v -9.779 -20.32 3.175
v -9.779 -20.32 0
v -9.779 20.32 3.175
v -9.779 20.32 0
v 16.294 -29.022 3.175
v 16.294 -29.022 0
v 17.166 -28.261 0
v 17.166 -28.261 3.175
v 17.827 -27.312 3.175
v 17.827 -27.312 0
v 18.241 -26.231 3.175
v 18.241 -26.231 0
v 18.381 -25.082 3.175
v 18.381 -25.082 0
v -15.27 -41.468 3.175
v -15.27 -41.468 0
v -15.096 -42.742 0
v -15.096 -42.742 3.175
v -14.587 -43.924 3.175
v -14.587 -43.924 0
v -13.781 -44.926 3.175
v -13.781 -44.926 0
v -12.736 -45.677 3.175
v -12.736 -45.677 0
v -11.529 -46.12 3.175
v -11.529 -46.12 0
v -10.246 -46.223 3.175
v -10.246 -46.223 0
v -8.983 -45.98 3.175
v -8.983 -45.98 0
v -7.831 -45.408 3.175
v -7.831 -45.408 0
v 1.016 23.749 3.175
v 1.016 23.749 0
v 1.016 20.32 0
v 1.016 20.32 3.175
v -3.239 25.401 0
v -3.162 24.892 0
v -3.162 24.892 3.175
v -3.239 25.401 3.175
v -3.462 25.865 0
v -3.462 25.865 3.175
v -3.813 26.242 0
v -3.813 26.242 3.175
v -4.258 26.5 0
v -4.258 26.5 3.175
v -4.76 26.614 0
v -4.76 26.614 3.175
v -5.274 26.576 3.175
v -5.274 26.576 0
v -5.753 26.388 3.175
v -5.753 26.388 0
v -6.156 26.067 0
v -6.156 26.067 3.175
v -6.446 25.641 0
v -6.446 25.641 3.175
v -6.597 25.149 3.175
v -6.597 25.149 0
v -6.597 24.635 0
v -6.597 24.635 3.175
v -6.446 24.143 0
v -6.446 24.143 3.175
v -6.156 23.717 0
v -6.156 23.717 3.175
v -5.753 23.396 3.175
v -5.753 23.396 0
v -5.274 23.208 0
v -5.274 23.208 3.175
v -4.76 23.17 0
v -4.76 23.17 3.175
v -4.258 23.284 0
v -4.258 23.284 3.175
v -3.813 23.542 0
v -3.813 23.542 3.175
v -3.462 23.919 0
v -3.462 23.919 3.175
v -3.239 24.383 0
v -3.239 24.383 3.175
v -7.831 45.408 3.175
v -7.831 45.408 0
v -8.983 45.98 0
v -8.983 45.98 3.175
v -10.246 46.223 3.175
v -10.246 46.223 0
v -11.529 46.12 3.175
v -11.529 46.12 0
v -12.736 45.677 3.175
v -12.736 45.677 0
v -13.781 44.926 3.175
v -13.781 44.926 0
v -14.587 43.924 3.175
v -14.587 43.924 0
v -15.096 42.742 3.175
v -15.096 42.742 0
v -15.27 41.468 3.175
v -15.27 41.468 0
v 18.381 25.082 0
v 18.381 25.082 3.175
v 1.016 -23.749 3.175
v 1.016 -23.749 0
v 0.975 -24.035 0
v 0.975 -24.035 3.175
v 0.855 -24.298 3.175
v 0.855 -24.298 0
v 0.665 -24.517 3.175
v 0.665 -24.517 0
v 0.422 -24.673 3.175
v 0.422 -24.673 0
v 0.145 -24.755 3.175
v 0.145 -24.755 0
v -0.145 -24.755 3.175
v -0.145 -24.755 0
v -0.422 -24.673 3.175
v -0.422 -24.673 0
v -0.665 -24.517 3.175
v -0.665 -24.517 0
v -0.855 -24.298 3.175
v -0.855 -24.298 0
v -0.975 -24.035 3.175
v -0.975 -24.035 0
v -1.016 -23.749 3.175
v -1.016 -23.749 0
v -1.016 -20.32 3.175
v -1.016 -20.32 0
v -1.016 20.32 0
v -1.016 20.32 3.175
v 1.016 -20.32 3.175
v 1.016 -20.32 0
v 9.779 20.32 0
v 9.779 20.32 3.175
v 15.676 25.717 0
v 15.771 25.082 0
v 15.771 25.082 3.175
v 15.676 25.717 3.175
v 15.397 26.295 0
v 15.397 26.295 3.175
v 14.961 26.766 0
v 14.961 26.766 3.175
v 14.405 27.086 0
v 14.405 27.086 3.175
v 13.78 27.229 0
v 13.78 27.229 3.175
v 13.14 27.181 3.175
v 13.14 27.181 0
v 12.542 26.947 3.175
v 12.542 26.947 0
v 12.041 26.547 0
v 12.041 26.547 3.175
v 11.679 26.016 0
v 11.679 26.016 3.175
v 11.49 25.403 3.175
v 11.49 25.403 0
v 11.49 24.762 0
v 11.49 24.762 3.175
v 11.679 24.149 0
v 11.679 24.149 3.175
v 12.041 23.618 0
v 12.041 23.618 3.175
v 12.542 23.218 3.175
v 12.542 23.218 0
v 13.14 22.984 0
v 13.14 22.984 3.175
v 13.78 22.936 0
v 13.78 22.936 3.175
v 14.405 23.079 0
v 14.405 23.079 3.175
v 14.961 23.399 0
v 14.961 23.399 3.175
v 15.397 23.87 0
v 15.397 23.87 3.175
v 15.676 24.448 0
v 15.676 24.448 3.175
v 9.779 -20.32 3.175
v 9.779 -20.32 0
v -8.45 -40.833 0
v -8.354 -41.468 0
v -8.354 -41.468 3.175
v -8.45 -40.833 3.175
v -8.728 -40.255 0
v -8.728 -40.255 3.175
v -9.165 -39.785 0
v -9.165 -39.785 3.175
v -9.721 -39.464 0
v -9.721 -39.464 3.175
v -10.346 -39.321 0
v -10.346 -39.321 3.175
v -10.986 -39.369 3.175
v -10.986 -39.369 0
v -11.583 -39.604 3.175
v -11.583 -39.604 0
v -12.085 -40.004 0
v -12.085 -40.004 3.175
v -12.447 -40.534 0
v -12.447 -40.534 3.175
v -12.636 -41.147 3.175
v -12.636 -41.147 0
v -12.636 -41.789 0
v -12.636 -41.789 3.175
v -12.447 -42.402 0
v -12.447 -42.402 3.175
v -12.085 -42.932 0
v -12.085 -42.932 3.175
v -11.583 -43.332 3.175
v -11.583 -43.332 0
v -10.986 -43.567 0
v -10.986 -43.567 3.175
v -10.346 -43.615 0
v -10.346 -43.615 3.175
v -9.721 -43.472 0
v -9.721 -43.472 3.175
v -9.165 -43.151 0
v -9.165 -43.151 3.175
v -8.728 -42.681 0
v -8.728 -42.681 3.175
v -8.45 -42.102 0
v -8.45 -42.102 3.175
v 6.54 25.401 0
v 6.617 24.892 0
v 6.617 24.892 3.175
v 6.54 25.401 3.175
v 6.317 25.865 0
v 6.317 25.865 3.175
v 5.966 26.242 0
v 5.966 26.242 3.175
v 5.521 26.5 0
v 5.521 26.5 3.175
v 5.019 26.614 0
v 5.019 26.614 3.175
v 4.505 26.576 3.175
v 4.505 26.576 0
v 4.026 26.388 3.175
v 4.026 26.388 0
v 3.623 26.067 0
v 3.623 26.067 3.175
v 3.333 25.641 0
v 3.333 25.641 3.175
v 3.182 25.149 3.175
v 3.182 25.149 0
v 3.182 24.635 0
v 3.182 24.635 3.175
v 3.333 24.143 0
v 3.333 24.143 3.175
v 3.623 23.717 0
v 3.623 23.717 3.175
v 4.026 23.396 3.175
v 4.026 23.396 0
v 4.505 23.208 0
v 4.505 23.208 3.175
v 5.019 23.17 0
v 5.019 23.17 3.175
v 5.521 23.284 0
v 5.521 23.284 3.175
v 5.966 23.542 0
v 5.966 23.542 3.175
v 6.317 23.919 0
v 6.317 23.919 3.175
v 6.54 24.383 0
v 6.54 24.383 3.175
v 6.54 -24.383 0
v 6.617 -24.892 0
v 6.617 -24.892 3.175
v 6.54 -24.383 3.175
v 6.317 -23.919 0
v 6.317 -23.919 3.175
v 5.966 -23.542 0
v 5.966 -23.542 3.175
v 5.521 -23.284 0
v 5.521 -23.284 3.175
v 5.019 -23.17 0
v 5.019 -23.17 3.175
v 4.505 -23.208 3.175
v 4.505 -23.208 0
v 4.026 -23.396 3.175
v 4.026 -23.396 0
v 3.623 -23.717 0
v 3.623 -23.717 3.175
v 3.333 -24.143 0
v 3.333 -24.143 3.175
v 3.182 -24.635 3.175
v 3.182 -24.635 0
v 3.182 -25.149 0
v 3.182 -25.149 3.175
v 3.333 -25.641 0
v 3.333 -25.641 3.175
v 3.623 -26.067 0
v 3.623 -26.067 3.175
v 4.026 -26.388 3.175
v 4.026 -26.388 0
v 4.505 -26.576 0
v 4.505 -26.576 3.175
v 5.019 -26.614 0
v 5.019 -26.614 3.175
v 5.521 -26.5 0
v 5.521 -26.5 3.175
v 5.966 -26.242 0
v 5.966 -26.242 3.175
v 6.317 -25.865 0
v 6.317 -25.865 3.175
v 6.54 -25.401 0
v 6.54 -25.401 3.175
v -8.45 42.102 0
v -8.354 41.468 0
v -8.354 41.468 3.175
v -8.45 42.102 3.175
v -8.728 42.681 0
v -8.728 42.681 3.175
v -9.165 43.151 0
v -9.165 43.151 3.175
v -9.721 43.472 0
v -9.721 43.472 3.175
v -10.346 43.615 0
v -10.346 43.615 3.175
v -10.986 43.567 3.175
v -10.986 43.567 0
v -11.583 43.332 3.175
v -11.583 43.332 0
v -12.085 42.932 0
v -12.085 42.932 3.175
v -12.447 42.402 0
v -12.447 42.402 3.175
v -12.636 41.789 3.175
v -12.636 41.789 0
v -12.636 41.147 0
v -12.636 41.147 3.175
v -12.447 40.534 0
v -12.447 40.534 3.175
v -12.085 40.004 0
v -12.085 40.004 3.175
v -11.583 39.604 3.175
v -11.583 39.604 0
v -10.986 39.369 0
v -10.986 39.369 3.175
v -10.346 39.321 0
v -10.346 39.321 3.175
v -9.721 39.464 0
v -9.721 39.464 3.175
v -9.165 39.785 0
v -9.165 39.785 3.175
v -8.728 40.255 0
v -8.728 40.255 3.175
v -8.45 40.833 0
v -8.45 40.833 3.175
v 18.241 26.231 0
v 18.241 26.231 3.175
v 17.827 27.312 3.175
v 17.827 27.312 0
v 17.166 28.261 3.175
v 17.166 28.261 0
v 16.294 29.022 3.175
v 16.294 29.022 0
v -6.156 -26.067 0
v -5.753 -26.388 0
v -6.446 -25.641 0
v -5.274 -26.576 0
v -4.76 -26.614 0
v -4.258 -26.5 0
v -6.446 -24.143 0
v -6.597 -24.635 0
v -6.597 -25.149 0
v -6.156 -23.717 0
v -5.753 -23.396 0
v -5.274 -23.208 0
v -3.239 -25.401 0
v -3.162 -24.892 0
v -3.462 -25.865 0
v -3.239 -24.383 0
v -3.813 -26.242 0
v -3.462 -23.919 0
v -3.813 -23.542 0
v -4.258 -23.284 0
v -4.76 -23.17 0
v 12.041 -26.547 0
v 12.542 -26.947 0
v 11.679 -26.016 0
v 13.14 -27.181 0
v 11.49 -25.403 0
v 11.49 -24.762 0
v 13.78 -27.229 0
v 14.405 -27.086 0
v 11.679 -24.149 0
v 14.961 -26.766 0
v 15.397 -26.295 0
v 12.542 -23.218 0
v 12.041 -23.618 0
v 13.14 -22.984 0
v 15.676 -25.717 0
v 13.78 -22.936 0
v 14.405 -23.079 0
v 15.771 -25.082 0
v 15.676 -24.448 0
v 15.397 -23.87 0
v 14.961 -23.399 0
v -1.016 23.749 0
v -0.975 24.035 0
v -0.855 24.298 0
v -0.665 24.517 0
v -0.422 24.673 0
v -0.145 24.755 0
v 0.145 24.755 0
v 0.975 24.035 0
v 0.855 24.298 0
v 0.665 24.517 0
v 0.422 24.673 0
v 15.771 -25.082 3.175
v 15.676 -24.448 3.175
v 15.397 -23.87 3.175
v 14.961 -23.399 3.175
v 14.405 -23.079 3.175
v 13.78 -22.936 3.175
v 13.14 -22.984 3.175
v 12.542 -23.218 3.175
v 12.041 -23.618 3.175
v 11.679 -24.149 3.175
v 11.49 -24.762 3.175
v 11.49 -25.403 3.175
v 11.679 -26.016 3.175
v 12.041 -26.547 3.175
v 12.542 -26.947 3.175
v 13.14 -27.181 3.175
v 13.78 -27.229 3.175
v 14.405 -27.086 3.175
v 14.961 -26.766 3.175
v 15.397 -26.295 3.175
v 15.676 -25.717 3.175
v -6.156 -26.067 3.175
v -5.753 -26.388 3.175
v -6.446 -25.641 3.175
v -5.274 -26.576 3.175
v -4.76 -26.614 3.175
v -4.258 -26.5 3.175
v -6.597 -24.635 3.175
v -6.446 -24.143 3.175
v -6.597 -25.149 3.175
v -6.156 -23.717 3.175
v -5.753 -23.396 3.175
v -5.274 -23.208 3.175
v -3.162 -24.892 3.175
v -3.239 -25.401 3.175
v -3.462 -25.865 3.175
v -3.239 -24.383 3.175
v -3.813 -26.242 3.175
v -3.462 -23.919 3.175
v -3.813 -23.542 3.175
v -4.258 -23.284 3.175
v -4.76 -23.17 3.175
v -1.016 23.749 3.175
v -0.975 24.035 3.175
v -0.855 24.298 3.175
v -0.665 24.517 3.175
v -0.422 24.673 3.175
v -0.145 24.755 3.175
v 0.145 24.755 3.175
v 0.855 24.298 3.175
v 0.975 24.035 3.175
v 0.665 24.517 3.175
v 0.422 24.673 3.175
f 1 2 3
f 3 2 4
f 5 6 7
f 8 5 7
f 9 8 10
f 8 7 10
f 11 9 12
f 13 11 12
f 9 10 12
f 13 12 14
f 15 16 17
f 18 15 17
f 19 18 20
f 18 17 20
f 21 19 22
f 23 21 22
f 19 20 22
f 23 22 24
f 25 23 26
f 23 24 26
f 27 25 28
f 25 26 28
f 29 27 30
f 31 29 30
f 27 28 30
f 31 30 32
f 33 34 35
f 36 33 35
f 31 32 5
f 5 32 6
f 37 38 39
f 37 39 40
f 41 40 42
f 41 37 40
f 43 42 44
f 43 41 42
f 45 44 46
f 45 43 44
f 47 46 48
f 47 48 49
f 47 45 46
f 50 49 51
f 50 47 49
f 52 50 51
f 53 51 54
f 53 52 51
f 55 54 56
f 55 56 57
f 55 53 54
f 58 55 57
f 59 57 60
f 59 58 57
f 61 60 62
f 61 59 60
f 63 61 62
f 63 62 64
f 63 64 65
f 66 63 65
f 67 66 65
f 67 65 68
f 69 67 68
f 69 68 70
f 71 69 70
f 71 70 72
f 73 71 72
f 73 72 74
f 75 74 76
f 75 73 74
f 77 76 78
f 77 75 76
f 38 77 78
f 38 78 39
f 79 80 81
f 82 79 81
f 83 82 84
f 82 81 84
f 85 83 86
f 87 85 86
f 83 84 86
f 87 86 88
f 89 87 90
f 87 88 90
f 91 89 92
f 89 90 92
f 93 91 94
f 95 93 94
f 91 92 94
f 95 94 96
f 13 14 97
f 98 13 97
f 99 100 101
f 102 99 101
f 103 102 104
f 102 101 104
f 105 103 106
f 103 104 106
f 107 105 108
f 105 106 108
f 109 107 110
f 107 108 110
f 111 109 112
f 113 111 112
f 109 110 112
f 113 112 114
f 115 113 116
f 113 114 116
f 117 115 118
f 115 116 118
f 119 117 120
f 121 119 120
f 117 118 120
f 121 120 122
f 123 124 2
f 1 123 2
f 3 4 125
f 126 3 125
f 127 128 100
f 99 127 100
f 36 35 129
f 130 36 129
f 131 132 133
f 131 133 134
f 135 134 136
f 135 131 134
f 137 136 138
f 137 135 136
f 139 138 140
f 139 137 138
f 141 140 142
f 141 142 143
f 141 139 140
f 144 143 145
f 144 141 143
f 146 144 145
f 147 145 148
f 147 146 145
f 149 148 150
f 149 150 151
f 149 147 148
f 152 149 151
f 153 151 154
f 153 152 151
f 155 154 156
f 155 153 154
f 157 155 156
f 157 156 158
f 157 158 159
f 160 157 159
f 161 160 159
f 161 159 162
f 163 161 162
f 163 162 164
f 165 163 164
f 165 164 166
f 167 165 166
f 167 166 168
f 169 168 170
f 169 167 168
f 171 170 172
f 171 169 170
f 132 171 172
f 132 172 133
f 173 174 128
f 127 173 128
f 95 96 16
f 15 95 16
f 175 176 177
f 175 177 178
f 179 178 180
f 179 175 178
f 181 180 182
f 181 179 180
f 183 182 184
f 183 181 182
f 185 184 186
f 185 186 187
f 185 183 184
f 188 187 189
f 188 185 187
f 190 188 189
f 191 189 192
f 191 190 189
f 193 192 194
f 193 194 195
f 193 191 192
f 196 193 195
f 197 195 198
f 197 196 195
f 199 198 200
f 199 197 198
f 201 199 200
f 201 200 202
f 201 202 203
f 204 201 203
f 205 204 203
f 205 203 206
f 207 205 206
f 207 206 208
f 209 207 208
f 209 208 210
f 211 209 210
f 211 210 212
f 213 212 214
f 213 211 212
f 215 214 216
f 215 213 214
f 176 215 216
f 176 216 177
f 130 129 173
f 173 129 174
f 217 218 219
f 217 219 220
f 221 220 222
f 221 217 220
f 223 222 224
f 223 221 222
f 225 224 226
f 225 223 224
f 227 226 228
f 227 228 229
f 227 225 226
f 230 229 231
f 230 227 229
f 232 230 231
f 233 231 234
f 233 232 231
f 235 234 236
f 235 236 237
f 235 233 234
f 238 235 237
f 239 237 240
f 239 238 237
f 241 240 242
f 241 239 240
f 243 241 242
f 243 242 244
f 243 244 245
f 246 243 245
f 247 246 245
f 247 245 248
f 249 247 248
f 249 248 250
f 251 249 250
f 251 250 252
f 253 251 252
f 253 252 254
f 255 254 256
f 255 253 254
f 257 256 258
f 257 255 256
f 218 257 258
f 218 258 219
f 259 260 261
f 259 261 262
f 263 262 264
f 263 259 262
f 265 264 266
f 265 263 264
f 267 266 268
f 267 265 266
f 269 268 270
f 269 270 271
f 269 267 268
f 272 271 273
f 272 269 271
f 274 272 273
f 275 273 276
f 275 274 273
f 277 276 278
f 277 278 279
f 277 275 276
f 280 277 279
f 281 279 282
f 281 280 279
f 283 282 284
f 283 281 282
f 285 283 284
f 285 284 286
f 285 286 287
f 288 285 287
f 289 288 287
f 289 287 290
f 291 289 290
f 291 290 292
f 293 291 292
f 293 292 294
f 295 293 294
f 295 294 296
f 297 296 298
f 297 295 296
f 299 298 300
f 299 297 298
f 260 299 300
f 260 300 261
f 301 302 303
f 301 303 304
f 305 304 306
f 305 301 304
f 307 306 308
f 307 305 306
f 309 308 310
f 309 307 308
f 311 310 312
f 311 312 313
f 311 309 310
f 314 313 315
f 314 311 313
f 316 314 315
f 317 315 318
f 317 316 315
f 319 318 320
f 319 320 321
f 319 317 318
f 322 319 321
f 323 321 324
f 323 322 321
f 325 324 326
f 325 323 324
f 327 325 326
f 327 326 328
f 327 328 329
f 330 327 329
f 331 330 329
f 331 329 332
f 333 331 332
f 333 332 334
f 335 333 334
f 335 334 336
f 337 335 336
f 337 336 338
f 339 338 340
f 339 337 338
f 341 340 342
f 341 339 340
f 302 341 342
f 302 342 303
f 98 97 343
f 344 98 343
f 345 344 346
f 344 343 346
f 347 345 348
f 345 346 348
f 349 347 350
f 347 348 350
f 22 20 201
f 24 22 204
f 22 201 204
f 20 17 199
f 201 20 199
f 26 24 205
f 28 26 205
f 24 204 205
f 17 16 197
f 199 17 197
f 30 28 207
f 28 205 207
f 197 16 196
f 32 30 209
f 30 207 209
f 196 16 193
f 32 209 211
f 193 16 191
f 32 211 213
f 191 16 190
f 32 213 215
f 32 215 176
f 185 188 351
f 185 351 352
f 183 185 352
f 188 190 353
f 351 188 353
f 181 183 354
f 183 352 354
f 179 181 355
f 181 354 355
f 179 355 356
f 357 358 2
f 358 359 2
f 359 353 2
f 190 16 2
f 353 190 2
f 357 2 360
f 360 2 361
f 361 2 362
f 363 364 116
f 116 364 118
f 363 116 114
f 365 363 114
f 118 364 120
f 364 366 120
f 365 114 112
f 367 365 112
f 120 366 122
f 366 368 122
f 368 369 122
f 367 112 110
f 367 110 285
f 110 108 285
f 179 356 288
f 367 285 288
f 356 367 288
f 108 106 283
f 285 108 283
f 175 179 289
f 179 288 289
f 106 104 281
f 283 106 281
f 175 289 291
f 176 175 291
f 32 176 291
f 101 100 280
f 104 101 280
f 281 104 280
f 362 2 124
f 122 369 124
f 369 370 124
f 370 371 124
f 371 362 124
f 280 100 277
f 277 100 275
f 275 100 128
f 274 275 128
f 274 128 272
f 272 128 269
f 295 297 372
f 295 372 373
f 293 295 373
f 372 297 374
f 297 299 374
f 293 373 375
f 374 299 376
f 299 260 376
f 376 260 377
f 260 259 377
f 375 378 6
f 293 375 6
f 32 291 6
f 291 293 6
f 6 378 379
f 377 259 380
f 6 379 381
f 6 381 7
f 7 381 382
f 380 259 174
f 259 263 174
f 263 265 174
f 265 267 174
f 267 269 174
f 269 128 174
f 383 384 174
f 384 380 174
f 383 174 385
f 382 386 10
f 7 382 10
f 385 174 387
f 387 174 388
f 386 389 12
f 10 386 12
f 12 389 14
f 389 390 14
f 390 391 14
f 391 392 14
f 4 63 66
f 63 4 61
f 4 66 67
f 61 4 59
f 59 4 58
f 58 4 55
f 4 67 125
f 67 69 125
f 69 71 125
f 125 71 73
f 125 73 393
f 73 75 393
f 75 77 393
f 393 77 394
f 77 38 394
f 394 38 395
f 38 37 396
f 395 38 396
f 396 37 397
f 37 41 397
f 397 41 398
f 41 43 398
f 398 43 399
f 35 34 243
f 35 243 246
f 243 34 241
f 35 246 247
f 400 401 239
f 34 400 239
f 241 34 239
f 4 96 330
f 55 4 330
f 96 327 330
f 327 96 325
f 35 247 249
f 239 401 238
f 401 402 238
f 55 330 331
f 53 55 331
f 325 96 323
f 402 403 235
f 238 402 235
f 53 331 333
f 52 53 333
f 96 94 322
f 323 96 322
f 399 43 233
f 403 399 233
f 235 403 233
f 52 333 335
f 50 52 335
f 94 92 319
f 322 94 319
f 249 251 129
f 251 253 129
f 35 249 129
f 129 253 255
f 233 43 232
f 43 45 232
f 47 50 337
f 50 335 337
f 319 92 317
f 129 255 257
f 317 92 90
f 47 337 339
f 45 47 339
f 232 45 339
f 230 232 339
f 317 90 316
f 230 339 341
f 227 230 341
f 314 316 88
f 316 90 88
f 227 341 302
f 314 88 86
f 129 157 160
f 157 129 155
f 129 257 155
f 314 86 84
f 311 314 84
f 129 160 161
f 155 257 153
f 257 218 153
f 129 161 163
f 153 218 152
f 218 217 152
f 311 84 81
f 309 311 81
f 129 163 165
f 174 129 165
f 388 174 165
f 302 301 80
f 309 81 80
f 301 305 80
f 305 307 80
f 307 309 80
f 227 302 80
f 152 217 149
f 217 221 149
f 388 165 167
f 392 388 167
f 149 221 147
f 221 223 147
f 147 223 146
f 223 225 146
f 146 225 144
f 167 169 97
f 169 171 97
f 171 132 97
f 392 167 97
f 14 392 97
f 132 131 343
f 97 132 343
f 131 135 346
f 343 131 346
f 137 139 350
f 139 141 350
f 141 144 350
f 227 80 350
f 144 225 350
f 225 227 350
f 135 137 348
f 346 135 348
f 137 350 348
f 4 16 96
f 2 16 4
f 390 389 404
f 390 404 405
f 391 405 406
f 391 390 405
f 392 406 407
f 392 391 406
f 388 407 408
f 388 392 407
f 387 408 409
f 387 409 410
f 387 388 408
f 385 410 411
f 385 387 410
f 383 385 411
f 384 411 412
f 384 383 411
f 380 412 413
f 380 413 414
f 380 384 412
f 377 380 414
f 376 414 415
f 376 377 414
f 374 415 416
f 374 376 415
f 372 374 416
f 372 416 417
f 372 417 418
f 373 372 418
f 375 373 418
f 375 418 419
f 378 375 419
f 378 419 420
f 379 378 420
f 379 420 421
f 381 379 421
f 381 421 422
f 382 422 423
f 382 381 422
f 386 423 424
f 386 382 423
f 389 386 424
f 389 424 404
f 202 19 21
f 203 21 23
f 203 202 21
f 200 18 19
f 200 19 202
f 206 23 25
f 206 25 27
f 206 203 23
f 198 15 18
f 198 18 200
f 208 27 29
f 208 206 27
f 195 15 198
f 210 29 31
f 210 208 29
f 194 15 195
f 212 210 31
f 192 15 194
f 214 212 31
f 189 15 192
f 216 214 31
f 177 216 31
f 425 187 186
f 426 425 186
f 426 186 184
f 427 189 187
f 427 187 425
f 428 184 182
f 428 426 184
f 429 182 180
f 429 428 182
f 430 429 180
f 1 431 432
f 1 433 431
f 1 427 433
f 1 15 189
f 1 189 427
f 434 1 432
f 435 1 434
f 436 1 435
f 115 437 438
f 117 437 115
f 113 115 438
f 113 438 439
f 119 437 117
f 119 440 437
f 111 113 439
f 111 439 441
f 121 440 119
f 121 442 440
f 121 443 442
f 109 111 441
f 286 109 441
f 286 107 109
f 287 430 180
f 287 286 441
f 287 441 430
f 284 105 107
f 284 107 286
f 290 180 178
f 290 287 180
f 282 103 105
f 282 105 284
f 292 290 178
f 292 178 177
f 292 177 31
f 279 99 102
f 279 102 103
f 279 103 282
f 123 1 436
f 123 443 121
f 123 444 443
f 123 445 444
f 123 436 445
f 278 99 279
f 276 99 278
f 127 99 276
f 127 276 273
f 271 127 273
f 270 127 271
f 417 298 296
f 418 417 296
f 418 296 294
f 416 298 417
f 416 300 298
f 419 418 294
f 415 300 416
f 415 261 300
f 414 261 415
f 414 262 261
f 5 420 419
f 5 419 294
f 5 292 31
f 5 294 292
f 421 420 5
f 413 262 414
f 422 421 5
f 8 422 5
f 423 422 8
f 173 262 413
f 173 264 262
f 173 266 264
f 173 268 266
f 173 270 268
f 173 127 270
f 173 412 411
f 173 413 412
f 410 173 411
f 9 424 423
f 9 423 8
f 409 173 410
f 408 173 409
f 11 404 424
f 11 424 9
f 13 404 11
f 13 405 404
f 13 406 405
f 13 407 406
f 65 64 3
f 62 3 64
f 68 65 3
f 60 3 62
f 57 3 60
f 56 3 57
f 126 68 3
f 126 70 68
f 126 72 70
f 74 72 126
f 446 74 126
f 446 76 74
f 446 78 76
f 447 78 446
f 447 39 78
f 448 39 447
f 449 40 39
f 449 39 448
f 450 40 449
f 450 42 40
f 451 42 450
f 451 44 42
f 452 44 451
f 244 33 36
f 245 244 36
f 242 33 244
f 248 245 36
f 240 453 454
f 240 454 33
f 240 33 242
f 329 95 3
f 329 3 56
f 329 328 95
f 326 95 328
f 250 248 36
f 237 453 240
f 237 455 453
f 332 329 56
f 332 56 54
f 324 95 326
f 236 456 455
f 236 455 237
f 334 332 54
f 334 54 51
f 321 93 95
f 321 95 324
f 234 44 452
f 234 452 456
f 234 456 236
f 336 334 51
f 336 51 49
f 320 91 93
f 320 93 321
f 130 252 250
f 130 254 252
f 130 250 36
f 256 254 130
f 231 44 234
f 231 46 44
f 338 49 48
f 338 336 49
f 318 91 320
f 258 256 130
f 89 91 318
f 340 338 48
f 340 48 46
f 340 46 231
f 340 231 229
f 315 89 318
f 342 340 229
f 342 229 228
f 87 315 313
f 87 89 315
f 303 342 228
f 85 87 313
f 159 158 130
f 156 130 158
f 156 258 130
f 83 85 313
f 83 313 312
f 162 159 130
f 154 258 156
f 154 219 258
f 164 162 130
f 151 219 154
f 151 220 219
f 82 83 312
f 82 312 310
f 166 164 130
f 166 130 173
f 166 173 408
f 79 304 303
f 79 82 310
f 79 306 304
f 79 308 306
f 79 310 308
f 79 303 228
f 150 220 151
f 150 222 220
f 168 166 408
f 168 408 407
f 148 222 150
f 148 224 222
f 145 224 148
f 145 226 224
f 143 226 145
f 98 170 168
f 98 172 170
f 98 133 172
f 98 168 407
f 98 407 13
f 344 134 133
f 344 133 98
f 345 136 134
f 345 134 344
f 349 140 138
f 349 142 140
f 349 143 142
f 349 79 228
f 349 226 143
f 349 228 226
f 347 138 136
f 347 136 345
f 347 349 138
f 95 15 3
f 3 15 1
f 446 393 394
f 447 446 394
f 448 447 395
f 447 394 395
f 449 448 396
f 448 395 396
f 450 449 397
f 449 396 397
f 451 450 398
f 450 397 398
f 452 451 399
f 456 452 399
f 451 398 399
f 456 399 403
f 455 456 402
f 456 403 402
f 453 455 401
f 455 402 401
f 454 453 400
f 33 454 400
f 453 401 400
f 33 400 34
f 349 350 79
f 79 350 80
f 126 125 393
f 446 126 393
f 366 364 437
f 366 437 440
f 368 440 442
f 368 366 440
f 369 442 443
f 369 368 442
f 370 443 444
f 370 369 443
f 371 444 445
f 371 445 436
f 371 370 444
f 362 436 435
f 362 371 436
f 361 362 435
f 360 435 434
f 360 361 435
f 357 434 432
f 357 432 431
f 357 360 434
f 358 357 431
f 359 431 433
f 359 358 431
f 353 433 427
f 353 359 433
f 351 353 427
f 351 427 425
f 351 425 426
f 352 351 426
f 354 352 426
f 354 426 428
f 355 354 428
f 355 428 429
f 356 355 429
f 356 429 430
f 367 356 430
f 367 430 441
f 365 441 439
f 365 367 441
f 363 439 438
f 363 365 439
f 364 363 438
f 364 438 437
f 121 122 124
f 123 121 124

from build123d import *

# Parameters (mm, degrees)
F0_R     = 2.15265
F0_R_2   = 1.7272
F1_DEPTH = 3.175


with BuildPart() as f1:
    # F0 (on Top) → F1 (new body)
    with BuildSketch(Plane.XY):
        with BuildLine():
            Line((18.381172, -25.0825), (18.381172, 25.0825))
            ThreePointArc((18.381172, 25.0825), (17.827276, 27.311637), (16.294431, 29.022261))
            Line((16.294431, 29.022261), (-7.831306, 45.407687))
            ThreePointArc((-7.831306, 45.407687), (-12.736203, 45.676531), (-15.269566, 41.467926))
            Line((-15.269566, 41.467926), (-15.269566, -41.467926))
            ThreePointArc((-15.269566, -41.467926), (-12.736203, -45.676531), (-7.831306, -45.407687))
            Line((-7.831306, -45.407687), (16.294431, -29.022261))
            ThreePointArc((16.294431, -29.022261), (17.827276, -27.311637), (18.381172, -25.0825))
        make_face()
        with Locations((-10.507066, -41.467926)):
            Circle(F0_R, mode=Mode.SUBTRACT)
        with Locations((-4.8895, -24.892)):
            Circle(F0_R_2, mode=Mode.SUBTRACT)
        with BuildLine():
            Line((-1.016, -20.32), (-9.779, -20.32))
            Line((-9.779, -20.32), (-9.779, 20.32))
            Line((-9.779, 20.32), (-1.016, 20.32))
            Line((-1.016, 20.32), (-1.016, 23.749))
            ThreePointArc((-1.016, 23.749), (0, 24.765), (1.016, 23.749))
            Line((1.016, 23.749), (1.016, 20.32))
            Line((1.016, 20.32), (9.779, 20.32))
            Line((9.779, 20.32), (9.779, -20.32))
            Line((9.779, -20.32), (1.016, -20.32))
            Line((1.016, -20.32), (1.016, -23.749))
            ThreePointArc((1.016, -23.749), (0, -24.765), (-1.016, -23.749))
            Line((-1.016, -23.749), (-1.016, -20.32))
        make_face(mode=Mode.SUBTRACT)
        with Locations((4.8895, -24.892)):
            Circle(F0_R_2, mode=Mode.SUBTRACT)
        with Locations((13.618672, -25.0825)):
            Circle(F0_R, mode=Mode.SUBTRACT)
        with Locations((-10.507066, 41.467926)):
            Circle(F0_R, mode=Mode.SUBTRACT)
        with Locations((-4.8895, 24.892)):
            Circle(F0_R_2, mode=Mode.SUBTRACT)
        with Locations((4.8895, 24.892)):
            Circle(F0_R_2, mode=Mode.SUBTRACT)
        with Locations((13.618672, 25.0825)):
            Circle(F0_R, mode=Mode.SUBTRACT)
    extrude(amount=F1_DEPTH)


solid = f1.part
